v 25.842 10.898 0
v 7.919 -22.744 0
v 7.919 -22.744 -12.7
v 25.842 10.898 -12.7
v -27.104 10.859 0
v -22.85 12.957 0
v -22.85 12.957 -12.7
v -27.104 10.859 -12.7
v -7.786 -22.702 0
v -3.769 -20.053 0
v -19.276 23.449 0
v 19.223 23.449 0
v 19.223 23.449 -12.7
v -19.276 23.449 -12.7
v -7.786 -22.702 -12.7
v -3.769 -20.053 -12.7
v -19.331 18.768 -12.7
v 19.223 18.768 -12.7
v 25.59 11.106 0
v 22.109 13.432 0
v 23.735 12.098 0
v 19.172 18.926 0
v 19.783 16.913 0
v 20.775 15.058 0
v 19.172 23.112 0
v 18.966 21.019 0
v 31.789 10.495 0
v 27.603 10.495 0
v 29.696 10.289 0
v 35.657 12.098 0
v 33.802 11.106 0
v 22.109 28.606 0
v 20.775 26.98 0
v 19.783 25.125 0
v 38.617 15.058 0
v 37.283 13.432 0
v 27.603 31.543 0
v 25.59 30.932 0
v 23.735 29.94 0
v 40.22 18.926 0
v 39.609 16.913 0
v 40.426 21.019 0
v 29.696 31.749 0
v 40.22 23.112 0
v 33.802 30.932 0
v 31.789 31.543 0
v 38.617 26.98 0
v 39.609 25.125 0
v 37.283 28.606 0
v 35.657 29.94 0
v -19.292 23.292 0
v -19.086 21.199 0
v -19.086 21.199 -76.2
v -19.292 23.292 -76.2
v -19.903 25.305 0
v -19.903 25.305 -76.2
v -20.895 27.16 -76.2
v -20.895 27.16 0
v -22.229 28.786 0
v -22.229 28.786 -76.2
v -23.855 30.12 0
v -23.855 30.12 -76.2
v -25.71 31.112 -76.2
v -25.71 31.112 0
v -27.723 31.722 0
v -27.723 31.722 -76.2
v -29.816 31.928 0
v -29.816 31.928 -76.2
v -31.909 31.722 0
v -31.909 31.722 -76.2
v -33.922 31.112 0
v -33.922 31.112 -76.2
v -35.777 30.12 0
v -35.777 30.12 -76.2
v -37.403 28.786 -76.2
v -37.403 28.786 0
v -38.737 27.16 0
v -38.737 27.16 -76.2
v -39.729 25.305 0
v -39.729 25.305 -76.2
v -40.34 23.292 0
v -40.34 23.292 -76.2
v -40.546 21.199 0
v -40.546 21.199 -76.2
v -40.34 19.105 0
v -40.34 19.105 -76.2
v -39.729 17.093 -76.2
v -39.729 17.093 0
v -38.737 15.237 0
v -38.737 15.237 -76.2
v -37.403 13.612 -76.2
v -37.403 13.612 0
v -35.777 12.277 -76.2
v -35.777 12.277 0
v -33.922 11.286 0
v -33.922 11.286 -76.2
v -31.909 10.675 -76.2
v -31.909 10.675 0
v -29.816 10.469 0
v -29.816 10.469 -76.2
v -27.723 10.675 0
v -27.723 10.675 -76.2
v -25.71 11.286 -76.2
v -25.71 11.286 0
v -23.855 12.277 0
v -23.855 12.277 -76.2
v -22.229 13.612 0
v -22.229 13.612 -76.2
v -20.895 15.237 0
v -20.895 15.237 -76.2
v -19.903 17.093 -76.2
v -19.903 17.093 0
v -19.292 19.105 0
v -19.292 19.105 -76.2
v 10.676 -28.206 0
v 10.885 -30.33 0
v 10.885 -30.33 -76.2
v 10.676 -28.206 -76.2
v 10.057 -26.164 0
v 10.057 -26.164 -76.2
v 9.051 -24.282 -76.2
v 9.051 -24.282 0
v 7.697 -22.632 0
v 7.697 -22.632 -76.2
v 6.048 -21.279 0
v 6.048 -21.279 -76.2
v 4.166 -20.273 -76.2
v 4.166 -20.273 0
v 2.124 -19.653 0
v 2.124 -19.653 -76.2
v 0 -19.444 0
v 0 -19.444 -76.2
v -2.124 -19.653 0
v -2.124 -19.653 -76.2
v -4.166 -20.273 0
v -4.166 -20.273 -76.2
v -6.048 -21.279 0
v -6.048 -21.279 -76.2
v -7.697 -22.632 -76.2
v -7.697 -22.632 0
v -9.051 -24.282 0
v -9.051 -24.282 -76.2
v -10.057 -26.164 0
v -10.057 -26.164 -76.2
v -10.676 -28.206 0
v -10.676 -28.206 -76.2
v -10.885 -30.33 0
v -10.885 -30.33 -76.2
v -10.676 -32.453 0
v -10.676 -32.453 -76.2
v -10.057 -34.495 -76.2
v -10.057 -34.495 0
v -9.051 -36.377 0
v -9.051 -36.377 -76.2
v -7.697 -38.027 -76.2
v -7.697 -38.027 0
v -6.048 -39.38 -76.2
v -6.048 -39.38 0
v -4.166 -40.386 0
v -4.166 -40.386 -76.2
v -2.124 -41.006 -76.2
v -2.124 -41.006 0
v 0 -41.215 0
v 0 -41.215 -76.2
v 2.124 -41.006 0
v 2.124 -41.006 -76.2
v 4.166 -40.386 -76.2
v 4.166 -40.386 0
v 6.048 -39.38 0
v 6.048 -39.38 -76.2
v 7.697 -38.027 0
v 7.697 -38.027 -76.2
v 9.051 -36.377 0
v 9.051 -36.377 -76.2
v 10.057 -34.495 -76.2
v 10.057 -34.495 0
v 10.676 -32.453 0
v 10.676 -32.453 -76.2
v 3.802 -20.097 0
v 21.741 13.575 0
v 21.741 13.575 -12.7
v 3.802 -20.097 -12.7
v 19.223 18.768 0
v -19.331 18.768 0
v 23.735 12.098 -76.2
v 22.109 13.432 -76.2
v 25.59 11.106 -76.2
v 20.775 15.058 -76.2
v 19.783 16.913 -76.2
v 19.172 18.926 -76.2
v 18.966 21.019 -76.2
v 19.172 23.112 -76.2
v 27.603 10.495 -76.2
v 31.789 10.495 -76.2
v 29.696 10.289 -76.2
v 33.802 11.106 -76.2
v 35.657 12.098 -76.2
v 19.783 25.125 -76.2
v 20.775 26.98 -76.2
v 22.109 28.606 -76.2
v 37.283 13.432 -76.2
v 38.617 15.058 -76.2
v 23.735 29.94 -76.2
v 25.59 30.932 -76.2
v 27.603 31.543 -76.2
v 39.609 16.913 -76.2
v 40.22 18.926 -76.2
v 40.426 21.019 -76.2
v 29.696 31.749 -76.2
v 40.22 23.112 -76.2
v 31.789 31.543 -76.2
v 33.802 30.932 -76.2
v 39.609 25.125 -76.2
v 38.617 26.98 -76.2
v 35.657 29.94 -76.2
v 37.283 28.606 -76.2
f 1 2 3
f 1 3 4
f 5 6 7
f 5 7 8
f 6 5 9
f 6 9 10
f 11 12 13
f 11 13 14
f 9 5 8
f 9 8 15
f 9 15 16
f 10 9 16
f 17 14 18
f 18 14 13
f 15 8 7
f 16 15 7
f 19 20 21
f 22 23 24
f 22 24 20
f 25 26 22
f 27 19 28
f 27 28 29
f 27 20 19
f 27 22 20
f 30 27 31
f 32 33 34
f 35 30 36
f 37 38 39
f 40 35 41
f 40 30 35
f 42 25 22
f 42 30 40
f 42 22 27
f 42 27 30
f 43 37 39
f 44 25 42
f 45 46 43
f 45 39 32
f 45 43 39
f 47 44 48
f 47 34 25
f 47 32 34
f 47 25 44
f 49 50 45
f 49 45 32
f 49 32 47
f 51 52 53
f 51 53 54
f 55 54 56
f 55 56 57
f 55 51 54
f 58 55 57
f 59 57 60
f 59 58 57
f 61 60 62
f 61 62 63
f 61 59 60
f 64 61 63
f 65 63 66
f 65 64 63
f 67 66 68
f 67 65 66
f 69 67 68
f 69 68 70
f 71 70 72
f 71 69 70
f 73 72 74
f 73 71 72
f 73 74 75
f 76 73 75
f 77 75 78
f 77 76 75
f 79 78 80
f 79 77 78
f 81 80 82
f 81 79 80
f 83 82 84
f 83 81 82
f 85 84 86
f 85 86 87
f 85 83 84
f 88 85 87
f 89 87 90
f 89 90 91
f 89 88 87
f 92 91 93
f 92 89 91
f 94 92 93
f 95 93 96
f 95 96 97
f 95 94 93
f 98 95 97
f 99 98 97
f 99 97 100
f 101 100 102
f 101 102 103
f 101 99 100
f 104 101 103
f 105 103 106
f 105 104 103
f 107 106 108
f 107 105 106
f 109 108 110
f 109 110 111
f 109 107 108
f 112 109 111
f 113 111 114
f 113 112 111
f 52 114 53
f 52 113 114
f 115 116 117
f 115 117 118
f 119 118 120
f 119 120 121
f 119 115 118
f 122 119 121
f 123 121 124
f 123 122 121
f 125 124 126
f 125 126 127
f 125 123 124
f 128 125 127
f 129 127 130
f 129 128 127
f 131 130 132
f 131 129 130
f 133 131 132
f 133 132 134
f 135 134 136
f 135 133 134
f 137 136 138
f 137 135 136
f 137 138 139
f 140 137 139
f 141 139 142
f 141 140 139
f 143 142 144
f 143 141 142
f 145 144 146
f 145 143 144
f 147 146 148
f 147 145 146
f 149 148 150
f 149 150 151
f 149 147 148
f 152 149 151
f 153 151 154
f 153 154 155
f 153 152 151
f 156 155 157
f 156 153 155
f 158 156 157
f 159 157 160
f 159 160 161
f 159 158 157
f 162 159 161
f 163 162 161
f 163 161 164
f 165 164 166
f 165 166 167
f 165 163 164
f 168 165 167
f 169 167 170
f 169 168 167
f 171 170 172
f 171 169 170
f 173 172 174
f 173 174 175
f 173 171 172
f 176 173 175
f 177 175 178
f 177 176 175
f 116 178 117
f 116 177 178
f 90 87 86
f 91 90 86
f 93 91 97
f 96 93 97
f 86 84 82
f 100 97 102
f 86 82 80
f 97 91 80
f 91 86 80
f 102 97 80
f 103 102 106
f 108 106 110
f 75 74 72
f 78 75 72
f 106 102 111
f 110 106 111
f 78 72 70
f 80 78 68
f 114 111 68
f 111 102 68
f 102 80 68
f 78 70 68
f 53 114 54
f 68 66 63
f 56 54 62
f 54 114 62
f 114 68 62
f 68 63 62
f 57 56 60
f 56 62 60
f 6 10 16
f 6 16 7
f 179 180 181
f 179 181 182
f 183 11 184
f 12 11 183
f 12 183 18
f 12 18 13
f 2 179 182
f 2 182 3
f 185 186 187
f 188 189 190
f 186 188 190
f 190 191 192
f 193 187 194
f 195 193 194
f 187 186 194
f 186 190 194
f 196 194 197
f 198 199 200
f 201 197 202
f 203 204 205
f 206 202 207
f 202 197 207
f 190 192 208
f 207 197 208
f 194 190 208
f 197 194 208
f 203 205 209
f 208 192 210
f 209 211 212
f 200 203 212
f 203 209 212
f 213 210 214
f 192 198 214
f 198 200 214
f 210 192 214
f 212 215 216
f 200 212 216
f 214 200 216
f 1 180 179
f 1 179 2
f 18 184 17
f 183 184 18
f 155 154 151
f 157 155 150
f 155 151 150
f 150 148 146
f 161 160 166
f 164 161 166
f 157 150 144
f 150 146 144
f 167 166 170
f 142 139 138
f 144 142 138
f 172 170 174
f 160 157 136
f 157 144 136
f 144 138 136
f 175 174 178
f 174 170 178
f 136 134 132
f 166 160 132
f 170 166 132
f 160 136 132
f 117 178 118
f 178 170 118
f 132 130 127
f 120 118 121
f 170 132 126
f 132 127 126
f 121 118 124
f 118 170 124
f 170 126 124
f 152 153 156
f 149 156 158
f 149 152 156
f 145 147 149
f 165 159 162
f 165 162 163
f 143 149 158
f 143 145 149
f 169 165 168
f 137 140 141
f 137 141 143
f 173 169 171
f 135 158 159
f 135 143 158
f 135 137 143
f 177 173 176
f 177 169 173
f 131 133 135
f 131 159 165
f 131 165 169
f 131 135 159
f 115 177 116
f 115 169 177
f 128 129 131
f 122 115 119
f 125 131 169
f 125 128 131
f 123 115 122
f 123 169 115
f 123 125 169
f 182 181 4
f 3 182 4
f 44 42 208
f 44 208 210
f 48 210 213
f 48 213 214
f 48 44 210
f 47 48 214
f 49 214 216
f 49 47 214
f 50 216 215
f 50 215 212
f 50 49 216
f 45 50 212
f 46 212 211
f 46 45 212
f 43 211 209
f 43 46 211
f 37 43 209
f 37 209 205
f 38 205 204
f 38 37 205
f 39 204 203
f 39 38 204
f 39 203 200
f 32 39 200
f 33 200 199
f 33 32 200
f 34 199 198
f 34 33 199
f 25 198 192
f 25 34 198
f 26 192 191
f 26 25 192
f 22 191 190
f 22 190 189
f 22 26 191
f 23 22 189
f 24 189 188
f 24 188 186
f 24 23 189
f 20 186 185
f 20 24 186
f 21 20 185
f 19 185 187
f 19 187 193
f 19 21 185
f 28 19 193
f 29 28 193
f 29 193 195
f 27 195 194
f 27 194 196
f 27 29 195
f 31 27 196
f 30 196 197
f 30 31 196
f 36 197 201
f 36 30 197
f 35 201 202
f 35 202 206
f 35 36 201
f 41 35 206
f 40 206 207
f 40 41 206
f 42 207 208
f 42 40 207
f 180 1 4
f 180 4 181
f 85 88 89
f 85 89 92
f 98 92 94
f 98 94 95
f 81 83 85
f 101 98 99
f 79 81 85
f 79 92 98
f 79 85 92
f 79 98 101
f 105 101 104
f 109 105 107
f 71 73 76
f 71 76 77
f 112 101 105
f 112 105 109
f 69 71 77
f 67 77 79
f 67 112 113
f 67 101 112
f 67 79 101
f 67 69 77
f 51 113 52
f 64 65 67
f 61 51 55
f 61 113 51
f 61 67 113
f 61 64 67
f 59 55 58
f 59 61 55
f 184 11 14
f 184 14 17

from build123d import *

# Parameters (mm, degrees)
F0_R     = 10.7297432275
F1_DEPTH = 76.2
F0_R_2   = 10.8853479612
F3_DEPTH = 12.7


# Not quite as in the source:
# - a length typed as a fraction of an inch, garbled in the dataset ("3 / 203.2 mm" for 3/8 in), is restored


with BuildPart() as f1:
    # F0 (on Top) → F1 (new body)
    with BuildSketch(Plane.XY):
        with Locations((-29.8160351813, 21.1986098439)):
            Circle(F0_R)
    extrude(amount=-F1_DEPTH)


with BuildPart() as f1b:
    # F0 (on Top) → F1, piece 2 (new body)
    with BuildSketch(Plane.XY):
        with Locations((29.6960119158, 21.0190378129)):
            Circle(F0_R)
    extrude(amount=-F1_DEPTH)


with BuildPart() as f1c:
    # F0 (on Top) → F1, piece 3 (new body)
    with BuildSketch(Plane.XY):
        with Locations((0, -30.3295161575)):
            Circle(F0_R_2)
    extrude(amount=-F1_DEPTH)


with BuildPart() as f3:
    # F2 (on Top) → F3 (new body)
    with BuildSketch(Plane.XY):
        Polygon((-19.2763544619, 23.4492365271), (-19.331432879, 18.7675692141), (19.2234721035, 18.7675692141), (19.2234721035, 23.4492365271), align=None)
    extrude(amount=-F3_DEPTH)


with BuildPart() as f3b:
    # F2 (on Top) → F3, piece 2 (new body)
    with BuildSketch(Plane.XY):
        Polygon((-27.1035581827, 10.8587807044), (-7.785834372, -22.7020327002), (-3.7693547531, -20.0526502035), (-22.8502620012, 12.9573745653), align=None)
    extrude(amount=-F3_DEPTH)


with BuildPart() as f3c:
    # F2 (on Top) → F3, piece 3 (new body)
    with BuildSketch(Plane.XY):
        Polygon((21.7406842858, 13.5751729831), (3.8015870377, -20.0973968022), (7.9187573865, -22.7441489697), (25.8416007684, 10.8979115078), align=None)
    extrude(amount=-F3_DEPTH)


solid = Compound([f1.part, f1b.part, f1c.part, f3.part, f3b.part, f3c.part])
